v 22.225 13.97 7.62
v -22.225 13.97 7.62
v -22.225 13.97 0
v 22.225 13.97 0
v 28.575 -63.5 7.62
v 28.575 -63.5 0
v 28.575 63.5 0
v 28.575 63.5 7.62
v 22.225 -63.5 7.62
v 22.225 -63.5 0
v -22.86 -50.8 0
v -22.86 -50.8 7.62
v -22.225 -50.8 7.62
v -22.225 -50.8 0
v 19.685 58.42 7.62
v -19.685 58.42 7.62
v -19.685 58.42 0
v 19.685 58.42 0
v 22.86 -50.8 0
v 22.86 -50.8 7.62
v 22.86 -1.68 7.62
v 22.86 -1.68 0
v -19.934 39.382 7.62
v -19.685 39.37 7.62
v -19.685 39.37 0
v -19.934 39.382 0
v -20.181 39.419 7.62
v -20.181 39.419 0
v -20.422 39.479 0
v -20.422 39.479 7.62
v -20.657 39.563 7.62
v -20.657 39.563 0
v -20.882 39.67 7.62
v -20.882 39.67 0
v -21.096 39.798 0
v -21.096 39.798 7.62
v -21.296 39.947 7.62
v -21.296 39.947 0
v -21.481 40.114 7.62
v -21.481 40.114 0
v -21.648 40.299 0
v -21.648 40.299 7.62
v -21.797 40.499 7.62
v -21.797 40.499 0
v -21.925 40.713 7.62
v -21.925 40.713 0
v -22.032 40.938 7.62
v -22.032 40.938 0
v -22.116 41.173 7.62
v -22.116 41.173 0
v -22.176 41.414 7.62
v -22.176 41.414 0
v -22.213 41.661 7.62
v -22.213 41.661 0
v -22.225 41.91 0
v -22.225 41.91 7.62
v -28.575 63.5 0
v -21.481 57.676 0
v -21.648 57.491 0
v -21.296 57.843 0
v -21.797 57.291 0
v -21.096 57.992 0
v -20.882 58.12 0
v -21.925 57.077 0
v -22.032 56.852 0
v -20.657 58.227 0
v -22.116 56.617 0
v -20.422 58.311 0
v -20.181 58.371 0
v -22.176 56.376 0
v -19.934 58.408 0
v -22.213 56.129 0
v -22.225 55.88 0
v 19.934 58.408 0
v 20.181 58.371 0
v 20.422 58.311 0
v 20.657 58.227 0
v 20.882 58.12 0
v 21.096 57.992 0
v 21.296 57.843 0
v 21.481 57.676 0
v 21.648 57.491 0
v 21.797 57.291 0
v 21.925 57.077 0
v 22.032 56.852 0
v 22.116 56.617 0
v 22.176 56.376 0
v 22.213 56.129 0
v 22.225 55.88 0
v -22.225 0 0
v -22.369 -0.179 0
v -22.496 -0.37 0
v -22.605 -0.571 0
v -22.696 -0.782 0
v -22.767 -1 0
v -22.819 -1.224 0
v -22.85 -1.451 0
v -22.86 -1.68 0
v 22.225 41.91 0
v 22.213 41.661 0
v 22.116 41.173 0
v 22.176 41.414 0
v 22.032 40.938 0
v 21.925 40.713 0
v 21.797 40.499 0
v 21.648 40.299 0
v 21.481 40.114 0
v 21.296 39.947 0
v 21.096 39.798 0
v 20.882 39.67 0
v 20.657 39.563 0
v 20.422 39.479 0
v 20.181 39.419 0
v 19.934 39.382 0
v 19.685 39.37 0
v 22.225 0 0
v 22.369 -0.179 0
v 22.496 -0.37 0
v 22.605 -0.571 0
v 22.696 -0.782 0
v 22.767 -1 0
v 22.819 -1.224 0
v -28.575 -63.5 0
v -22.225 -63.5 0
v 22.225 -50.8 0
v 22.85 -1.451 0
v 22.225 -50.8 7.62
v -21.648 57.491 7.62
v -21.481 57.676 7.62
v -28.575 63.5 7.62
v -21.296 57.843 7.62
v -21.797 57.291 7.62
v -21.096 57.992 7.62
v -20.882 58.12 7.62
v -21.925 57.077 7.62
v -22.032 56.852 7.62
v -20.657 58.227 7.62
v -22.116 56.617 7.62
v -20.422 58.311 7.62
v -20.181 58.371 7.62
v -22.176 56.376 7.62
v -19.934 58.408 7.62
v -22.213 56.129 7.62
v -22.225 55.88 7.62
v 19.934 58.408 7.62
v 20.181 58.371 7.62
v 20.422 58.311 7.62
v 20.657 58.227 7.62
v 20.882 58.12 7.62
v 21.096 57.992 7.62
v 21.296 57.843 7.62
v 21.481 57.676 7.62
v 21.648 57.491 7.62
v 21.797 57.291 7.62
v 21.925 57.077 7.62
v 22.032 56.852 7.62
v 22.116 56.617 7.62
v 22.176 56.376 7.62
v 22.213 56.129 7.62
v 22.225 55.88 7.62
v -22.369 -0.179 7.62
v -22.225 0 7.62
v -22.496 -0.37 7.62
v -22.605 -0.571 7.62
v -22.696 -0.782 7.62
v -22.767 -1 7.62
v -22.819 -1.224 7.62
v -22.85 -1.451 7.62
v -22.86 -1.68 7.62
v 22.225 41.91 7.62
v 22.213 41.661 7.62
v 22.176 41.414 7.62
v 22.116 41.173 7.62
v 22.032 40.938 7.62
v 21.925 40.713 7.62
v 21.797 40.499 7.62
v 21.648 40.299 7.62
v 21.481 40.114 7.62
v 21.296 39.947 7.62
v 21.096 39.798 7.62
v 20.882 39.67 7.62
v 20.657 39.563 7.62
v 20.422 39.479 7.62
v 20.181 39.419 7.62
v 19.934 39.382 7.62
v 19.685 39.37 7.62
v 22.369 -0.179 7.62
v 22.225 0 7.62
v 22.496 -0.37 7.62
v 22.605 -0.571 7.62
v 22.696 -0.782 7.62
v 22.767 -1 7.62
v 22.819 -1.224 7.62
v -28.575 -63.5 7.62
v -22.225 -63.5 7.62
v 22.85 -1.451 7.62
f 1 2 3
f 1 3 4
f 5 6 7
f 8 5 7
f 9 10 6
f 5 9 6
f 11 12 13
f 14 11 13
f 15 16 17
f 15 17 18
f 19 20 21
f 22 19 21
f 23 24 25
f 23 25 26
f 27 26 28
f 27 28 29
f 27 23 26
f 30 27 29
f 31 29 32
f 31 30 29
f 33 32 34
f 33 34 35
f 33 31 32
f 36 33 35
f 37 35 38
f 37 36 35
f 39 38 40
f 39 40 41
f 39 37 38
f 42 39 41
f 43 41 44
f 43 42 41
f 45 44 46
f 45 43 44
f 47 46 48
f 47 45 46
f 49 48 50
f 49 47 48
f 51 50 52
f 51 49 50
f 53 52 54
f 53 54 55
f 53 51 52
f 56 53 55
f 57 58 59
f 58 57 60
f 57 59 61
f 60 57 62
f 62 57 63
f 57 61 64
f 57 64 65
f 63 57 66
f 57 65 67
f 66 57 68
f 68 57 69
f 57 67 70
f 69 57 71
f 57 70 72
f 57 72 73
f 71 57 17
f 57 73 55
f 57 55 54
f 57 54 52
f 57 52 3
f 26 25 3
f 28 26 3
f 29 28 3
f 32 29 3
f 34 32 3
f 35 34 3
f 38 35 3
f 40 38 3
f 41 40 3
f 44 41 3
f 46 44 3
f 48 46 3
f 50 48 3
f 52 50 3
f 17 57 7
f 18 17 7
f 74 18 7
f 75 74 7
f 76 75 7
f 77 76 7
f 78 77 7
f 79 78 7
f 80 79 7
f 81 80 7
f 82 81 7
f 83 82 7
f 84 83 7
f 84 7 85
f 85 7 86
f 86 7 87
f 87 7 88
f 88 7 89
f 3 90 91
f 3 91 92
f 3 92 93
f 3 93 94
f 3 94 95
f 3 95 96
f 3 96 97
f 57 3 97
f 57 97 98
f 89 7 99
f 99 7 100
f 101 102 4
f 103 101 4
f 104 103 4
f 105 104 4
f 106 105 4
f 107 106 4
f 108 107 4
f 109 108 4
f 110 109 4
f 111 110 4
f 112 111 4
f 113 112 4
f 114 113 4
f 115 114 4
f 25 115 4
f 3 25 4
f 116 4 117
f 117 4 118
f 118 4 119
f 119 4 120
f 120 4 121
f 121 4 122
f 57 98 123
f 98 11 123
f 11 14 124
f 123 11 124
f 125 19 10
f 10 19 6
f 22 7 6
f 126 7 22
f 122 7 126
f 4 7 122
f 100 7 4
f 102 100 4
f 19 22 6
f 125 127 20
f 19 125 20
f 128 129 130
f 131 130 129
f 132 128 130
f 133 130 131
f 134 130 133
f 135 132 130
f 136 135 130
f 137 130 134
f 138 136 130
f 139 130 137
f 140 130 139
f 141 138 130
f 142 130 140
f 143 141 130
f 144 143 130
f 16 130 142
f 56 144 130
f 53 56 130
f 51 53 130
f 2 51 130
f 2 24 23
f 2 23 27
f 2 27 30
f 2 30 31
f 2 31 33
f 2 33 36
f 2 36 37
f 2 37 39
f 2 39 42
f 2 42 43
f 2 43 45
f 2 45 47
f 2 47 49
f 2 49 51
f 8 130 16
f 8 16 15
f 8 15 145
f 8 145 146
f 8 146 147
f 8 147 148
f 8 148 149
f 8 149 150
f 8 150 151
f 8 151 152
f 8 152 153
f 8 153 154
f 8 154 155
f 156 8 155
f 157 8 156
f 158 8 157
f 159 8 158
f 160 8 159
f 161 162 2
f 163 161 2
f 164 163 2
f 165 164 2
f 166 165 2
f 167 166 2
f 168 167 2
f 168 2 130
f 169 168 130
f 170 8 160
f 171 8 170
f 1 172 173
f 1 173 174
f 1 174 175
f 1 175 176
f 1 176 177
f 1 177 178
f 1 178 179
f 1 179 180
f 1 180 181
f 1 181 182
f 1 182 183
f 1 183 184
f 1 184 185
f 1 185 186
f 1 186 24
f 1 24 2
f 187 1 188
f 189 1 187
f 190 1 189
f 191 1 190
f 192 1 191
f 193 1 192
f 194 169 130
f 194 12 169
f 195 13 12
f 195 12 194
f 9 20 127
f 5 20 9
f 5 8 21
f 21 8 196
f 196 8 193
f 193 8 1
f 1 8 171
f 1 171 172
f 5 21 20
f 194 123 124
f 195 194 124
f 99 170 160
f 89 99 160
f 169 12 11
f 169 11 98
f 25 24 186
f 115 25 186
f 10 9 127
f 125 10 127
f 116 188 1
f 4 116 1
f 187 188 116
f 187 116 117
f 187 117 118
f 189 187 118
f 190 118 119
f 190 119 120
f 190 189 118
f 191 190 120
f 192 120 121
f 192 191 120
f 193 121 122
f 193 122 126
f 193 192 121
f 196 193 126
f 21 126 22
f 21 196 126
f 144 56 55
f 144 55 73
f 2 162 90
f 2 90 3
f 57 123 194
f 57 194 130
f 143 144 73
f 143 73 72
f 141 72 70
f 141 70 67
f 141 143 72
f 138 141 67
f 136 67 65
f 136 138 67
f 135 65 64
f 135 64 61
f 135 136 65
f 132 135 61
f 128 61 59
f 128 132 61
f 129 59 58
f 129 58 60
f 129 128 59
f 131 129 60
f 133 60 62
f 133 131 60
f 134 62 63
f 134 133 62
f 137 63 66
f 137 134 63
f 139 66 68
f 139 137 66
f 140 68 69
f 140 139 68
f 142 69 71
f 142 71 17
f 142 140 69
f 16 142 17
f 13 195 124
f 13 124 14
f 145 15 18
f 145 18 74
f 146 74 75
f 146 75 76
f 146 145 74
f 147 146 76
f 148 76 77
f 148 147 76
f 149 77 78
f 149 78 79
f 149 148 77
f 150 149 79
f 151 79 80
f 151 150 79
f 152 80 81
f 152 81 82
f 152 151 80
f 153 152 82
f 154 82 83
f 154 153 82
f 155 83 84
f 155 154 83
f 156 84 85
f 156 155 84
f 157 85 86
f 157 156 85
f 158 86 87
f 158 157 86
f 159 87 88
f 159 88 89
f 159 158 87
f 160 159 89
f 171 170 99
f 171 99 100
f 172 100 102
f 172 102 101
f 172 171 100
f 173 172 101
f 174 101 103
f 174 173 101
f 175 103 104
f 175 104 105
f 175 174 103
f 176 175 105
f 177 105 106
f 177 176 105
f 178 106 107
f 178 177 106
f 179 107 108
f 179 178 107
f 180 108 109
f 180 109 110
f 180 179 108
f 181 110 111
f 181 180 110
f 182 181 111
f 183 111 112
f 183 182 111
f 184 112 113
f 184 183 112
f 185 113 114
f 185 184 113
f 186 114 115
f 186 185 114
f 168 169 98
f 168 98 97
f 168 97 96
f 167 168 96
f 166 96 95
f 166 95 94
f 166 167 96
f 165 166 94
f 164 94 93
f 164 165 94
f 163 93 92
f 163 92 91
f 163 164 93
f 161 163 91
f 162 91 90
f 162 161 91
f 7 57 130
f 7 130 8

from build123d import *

# Parameters (mm, degrees)
SKETCH1_W           = 57.15
SKETCH1_H           = 127
BOSS_EXTRUDE1_DEPTH = 7.62
SKETCH2_W           = 44.45
SKETCH2_H           = 121.92
CUT_EXTRUDE1_DEPTH  = 71.048875972
SKETCH4_W           = 45.72
SKETCH4_H           = 50.8
CUT_EXTRUDE2_DEPTH  = 71.048875972
SKETCH5_W           = 44.45
SKETCH5_H           = 25.4
BOSS_EXTRUDE2_DEPTH = 7.62
FILLET1_R           = 2.54


with BuildPart() as part:
    # Sketch1 → Boss-Extrude1 (new body)
    with BuildSketch(Plane.XY):
        Rectangle(SKETCH1_W, SKETCH1_H)
    extrude(amount=BOSS_EXTRUDE1_DEPTH)

    # Sketch2 → Cut-Extrude1 (cut, through all)
    with BuildSketch(Plane.XY.offset(7.62)):
        with Locations((0, -2.54)):
            Rectangle(SKETCH2_W, SKETCH2_H)
    extrude(amount=-CUT_EXTRUDE1_DEPTH, mode=Mode.SUBTRACT)

    # Sketch4 → Cut-Extrude2 (cut, through all)
    with BuildSketch(Plane.XY.offset(7.62)):
        with Locations((0, -25.4)):
            Rectangle(SKETCH4_W, SKETCH4_H)
    extrude(amount=-CUT_EXTRUDE2_DEPTH, mode=Mode.SUBTRACT)

    # Sketch5 → Boss-Extrude2 (add)
    with BuildSketch(Plane.XY.offset(7.62)):
        with Locations((0, 26.67)):
            Rectangle(SKETCH5_W, SKETCH5_H)
    extrude(amount=-BOSS_EXTRUDE2_DEPTH)

    # Fillet1
    # the kernel refuses this fillet: 2.54 mm, written as the material it adds along each edge
    with BuildSketch(Plane(origin=(-22.225, 58.42, 7.62), x_dir=(1, 0, 0), z_dir=(0, 0, -1)), Plane(origin=(22.225, 58.42, 7.62), x_dir=(0, -1, 0), z_dir=(0, 0, -1)), Plane(origin=(-22.225, 39.37, 7.62), x_dir=(0, 1, 0), z_dir=(0, 0, -1))) as fillet1_piece_1:
        with BuildLine():
            CenterArc((FILLET1_R, FILLET1_R), FILLET1_R, 180, 90)
            Line((0, FILLET1_R), (-FILLET1_R * 0.02, FILLET1_R))
            Line((-FILLET1_R * 0.02, FILLET1_R), (-FILLET1_R * 0.02, -FILLET1_R * 0.02))
            Line((-FILLET1_R * 0.02, -FILLET1_R * 0.02), (FILLET1_R, -FILLET1_R * 0.02))
            Line((FILLET1_R, -FILLET1_R * 0.02), (FILLET1_R, 0))
        make_face()
    extrude(amount=7.62)
    with BuildSketch(Plane(origin=(22.86, 0, 7.62), x_dir=(0, -1, 0), z_dir=(0, 0, -1))) as fillet1_piece_2:
        with BuildLine():
            CenterArc((1.680052083, 2.54), FILLET1_R, 228.590377891, 41.409622109)
            Line((0, 0.635), (-0.033601042, 0.5969))
            ThreePointArc((-0.033601042, 0.5969), (-0.0508, 0.3175), (-0.0508, 0))
            Line((-0.0508, 0), (0, -0.0508))
            Line((0, -0.0508), (1.680052083, -0.0508))
            Line((1.680052083, -0.0508), (1.680052083, 0))
        make_face()
    extrude(amount=7.62)
    with BuildSketch(Plane(origin=(-22.86, 0, 7.62), x_dir=(1, 0, 0), z_dir=(0, 0, -1))) as fillet1_piece_3:
        with BuildLine():
            CenterArc((2.54, 1.680052083), FILLET1_R, 180, 41.409622109)
            Line((0, 1.680052083), (-0.0508, 1.680052083))
            Line((-0.0508, 1.680052083), (-0.0508, 0))
            Line((-0.0508, 0), (0, -0.0508))
            ThreePointArc((0, -0.0508), (0.3175, -0.0508), (0.5969, -0.033601042))
            Line((0.5969, -0.033601042), (0.635, 0))
        make_face()
    extrude(amount=7.62)
    with BuildSketch(Plane(origin=(22.225, 39.37, 7.62), x_dir=(0, 1, 0), z_dir=(0, 0, -1))) as fillet1_piece_4:
        with BuildLine():
            CenterArc((FILLET1_R, -FILLET1_R), FILLET1_R, 90, 90)
            Line((0, -FILLET1_R), (-FILLET1_R * 0.02, -FILLET1_R))
            Line((-FILLET1_R * 0.02, -FILLET1_R), (-FILLET1_R * 0.02, FILLET1_R * 0.02))
            Line((-FILLET1_R * 0.02, FILLET1_R * 0.02), (FILLET1_R, FILLET1_R * 0.02))
            Line((FILLET1_R, FILLET1_R * 0.02), (FILLET1_R, 0))
        make_face()
    extrude(amount=7.62)


solid = part.part
